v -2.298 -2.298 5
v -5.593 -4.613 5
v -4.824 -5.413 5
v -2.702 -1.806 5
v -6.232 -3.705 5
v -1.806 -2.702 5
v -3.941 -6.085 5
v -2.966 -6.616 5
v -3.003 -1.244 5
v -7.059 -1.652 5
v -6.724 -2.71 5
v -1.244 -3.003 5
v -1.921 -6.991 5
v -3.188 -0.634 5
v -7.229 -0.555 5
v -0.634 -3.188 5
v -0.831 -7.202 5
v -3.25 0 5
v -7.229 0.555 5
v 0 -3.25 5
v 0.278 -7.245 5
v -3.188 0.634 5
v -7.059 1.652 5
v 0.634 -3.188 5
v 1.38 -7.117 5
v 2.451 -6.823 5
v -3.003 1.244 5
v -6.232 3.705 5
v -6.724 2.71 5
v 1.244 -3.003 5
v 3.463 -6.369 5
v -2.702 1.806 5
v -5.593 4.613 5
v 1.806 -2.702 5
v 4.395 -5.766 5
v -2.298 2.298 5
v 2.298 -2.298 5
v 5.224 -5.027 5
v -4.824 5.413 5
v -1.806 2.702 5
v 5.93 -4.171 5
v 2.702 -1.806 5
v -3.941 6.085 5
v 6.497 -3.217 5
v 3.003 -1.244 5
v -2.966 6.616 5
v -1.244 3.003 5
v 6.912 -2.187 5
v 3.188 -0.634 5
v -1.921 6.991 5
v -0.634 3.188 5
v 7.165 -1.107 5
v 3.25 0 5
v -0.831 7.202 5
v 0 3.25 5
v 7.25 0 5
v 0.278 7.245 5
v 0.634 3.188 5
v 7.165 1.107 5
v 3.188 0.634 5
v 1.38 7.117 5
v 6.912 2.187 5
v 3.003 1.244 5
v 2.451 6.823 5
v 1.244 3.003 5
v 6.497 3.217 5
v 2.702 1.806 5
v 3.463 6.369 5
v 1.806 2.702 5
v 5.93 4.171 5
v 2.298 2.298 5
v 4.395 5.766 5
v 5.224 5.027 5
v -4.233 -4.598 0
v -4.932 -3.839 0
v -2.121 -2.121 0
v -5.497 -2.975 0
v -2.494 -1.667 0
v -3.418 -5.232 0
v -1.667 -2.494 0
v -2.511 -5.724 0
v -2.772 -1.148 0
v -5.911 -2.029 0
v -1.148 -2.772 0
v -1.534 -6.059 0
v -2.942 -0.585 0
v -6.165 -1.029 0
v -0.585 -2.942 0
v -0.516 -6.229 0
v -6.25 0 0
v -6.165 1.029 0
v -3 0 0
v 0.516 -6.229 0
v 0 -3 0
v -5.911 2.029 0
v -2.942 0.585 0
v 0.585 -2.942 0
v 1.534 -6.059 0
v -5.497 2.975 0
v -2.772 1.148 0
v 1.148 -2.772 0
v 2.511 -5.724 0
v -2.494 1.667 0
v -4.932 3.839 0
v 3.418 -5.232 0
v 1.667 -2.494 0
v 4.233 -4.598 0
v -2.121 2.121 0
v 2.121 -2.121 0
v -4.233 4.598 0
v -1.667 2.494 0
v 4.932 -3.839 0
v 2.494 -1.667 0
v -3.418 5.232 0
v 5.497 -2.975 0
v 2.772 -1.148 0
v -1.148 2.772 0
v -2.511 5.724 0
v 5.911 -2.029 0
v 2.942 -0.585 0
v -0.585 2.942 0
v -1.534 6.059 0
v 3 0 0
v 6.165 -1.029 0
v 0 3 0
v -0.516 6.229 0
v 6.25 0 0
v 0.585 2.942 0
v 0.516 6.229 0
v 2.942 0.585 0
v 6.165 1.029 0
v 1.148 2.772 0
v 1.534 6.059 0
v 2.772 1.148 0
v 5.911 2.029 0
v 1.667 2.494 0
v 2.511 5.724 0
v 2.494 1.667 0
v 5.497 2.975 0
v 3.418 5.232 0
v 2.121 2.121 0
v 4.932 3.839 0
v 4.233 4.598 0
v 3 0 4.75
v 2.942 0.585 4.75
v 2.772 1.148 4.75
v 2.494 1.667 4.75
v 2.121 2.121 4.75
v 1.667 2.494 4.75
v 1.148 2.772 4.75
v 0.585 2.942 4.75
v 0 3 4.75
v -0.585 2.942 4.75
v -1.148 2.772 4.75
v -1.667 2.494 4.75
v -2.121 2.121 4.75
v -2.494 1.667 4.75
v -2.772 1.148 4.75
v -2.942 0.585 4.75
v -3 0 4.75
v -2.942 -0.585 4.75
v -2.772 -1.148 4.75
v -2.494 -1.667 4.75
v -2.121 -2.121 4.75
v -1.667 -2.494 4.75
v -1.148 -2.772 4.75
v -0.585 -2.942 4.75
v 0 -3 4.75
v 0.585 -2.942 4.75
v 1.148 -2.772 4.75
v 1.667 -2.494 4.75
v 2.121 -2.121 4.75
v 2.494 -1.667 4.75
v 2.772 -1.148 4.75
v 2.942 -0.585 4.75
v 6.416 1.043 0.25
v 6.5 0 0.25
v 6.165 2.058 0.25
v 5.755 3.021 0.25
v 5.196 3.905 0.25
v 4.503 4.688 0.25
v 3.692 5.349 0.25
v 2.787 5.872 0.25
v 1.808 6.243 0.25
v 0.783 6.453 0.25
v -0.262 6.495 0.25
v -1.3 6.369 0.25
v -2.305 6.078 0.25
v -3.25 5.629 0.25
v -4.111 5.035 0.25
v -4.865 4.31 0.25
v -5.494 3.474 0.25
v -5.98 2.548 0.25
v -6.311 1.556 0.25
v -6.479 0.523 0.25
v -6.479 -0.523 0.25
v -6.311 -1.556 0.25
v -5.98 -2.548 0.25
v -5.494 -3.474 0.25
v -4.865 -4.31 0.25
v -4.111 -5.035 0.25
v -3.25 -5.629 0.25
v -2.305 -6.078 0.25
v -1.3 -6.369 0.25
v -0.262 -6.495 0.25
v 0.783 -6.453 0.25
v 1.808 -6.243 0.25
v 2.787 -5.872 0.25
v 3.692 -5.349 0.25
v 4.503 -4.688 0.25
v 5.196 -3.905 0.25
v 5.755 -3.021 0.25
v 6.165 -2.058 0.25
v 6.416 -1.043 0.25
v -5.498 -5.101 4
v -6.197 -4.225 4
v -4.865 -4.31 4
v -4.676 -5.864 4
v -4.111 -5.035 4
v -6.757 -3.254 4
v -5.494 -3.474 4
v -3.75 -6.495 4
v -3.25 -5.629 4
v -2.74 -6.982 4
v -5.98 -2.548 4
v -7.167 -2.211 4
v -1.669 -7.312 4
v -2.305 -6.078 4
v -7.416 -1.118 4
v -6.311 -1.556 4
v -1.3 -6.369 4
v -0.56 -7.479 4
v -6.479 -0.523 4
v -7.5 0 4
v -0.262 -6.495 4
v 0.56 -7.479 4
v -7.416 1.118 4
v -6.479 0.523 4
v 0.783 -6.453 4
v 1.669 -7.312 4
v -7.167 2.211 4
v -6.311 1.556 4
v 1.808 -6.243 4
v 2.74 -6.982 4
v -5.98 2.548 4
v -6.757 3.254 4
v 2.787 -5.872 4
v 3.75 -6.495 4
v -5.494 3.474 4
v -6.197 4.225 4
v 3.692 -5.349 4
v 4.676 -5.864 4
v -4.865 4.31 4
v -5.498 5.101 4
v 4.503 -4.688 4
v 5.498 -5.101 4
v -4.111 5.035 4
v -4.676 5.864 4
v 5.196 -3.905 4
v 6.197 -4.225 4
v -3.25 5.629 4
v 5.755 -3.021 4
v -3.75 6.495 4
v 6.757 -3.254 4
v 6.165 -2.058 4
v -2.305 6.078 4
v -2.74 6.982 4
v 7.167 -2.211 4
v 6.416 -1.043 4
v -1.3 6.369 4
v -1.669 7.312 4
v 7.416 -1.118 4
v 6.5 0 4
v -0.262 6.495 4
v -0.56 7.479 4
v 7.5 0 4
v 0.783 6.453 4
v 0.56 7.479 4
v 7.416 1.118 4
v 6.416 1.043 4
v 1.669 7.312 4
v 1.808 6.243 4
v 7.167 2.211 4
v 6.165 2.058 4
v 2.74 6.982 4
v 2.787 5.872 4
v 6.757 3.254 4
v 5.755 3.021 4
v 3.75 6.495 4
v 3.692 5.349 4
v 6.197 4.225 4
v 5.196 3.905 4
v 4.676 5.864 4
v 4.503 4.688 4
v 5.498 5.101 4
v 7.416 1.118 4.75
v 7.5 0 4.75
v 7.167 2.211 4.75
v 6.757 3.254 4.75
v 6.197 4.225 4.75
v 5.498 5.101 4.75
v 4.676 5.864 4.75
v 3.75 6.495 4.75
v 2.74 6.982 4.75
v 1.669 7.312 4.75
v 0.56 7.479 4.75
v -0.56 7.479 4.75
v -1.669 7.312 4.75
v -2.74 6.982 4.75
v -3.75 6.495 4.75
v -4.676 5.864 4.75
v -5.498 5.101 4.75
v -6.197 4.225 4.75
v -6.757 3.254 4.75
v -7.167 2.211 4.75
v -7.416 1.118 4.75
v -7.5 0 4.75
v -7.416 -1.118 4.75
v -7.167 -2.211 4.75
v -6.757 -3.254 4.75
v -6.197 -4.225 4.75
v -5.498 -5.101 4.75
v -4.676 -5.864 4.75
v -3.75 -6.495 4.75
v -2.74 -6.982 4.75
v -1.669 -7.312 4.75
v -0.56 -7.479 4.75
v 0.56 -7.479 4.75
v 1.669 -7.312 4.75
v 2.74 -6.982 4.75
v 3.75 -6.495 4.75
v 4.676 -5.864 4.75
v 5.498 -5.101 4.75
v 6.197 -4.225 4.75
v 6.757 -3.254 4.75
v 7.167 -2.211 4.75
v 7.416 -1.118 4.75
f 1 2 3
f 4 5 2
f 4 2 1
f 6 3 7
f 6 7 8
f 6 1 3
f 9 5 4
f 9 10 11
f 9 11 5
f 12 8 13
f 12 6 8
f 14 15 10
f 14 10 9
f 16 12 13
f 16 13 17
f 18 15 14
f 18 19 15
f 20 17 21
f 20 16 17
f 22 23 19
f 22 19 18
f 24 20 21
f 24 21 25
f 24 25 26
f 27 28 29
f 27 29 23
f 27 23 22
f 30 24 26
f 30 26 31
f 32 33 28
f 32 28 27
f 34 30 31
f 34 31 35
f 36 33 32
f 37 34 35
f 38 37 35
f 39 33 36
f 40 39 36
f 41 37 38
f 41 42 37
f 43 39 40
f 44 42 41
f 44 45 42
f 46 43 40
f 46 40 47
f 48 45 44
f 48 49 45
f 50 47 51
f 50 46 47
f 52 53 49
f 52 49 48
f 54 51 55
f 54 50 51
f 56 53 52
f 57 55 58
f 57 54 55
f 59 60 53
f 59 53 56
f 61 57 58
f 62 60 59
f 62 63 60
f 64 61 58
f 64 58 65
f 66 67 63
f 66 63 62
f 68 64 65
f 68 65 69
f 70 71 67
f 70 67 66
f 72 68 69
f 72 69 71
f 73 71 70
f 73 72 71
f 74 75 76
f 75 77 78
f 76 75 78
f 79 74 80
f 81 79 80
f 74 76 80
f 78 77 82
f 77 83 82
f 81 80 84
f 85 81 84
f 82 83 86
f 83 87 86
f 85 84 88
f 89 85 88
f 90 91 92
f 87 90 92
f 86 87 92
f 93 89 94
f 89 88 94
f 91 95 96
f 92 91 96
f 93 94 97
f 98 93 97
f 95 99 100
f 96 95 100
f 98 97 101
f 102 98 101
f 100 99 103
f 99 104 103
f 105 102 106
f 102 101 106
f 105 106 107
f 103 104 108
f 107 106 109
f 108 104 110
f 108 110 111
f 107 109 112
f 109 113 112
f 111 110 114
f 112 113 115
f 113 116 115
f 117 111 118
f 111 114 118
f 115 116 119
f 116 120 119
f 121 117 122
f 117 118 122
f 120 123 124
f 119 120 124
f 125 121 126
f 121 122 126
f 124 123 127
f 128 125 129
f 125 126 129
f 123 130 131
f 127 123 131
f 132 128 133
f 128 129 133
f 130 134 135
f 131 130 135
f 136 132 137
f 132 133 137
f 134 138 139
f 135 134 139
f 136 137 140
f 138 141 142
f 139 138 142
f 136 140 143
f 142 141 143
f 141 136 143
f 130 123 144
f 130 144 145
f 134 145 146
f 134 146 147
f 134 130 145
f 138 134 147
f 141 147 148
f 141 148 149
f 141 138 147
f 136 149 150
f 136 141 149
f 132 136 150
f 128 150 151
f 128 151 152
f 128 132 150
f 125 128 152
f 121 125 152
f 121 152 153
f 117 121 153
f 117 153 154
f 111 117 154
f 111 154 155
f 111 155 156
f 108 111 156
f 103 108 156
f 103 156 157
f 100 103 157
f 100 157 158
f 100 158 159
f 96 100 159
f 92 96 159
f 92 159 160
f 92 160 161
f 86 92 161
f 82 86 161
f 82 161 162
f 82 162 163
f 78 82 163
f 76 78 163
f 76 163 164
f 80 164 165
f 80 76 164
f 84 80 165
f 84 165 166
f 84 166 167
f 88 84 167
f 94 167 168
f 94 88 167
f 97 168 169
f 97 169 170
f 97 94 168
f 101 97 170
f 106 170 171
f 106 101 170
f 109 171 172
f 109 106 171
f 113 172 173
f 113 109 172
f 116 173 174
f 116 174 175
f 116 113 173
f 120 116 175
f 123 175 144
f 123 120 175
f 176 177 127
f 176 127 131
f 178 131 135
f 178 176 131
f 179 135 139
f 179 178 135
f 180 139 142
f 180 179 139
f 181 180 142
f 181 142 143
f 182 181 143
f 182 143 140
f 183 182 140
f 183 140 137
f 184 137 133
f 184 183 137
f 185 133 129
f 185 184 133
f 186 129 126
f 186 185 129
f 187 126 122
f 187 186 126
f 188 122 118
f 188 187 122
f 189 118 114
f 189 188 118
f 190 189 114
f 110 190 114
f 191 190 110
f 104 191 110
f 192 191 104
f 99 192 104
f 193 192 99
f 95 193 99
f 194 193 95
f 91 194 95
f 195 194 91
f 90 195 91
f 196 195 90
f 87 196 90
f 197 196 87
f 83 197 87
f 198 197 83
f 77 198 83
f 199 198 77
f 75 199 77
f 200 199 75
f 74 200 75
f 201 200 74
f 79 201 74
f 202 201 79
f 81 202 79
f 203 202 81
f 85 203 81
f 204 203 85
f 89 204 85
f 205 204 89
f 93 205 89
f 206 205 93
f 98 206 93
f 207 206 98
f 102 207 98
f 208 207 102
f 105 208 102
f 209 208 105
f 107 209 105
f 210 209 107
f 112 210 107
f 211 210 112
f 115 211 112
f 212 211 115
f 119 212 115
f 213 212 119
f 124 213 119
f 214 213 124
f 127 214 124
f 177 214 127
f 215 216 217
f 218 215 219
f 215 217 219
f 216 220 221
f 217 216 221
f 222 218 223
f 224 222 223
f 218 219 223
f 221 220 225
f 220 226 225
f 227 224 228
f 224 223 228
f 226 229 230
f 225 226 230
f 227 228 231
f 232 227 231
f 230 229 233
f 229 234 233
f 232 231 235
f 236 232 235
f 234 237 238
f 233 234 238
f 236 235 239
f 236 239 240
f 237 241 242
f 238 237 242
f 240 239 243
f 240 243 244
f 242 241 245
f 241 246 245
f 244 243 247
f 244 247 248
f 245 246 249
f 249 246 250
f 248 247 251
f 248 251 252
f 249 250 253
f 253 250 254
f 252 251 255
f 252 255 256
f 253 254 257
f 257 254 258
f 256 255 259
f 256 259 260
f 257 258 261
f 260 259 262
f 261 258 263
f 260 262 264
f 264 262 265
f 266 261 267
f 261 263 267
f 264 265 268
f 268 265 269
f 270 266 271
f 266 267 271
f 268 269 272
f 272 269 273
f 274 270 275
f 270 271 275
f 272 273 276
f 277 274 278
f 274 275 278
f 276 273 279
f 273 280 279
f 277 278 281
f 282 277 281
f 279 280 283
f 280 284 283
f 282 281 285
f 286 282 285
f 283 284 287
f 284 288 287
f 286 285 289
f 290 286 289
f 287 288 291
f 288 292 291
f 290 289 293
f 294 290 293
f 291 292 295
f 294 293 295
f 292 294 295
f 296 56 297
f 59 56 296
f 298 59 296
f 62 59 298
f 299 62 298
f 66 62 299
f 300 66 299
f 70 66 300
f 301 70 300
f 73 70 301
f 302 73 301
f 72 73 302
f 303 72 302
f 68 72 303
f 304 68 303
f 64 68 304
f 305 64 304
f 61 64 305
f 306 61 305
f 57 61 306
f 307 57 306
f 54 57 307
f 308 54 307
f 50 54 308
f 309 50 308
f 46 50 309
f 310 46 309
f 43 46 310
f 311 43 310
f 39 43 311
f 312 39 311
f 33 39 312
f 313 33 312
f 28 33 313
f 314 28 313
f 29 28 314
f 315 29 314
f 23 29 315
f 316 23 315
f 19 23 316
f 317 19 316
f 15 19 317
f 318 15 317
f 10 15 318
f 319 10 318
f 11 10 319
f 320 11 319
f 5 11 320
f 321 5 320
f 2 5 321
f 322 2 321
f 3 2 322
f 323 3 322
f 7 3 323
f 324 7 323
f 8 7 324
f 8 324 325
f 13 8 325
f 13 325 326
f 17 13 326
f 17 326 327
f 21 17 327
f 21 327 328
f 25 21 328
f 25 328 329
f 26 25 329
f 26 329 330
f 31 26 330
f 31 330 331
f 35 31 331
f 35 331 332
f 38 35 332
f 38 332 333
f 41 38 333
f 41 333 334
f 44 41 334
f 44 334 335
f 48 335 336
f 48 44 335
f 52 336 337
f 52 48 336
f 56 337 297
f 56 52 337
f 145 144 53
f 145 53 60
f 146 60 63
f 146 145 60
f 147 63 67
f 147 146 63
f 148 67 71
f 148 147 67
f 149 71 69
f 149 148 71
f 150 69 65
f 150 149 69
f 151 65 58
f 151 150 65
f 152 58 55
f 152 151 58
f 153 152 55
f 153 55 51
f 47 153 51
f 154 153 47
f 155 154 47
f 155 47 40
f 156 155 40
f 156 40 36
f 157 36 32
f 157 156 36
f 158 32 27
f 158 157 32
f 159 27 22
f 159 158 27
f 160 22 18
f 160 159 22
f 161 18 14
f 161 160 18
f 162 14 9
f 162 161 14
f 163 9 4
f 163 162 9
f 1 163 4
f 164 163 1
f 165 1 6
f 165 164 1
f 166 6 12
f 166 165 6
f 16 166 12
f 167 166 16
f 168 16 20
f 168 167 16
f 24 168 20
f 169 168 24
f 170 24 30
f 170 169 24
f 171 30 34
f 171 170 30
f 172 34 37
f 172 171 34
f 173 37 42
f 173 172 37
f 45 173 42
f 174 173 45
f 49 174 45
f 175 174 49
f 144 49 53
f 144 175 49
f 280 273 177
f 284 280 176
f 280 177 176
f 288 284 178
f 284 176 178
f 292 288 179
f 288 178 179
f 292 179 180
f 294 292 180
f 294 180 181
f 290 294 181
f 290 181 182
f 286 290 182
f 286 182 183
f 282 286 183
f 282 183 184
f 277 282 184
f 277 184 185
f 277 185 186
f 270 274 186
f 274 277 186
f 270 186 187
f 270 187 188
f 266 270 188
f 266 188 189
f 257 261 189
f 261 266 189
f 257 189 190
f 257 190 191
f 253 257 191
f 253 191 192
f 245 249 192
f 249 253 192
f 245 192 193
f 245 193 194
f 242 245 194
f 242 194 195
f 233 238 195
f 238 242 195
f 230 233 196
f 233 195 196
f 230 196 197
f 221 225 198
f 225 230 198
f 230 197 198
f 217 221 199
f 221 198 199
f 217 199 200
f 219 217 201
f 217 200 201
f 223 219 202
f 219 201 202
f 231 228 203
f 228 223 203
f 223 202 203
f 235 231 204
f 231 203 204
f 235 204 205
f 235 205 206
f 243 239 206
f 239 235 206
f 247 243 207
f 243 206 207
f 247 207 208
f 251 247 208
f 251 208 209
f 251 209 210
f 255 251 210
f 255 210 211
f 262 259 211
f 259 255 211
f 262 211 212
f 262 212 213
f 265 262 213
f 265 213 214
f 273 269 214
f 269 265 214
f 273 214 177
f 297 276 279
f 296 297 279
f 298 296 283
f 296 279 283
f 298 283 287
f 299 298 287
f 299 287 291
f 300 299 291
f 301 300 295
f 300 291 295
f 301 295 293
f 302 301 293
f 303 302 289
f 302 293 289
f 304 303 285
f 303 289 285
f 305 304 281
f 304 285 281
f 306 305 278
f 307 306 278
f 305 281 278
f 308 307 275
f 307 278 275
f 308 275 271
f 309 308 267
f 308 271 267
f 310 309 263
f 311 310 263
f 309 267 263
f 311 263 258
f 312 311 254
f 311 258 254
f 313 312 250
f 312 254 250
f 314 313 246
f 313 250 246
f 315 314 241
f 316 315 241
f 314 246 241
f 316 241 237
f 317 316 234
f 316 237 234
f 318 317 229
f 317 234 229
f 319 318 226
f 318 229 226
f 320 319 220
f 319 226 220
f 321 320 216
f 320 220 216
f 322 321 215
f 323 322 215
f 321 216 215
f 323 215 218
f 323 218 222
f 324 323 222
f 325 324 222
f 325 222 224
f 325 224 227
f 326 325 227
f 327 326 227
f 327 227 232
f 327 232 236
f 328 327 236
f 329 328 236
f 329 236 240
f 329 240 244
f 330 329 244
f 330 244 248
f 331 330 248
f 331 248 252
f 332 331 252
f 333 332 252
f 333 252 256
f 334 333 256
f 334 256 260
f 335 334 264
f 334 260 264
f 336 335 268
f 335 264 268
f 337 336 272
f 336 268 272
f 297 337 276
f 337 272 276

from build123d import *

# Parameters (mm, degrees)
ESQUISSE1_R        = 6.5
ESQUISSE1_R_2      = 3
BOSS_EXTRU_1_DEPTH = 5
BOSS_EXTRU_2_START = -1
ESQUISSE2_R        = 7.5
ESQUISSE2_R_2      = 3
BOSS_EXTRU_2_DEPTH = 1
CHANFREIN1_SIZE    = 0.25


with BuildPart() as part:
    # Esquisse1 → Boss.-Extru.1 (new body)
    with BuildSketch(Plane.XY):
        Circle(ESQUISSE1_R)
        Circle(ESQUISSE1_R_2, mode=Mode.SUBTRACT)
    extrude(amount=BOSS_EXTRU_1_DEPTH)

    # Esquisse2 → Boss.-Extru.2 (add)
    with BuildSketch(Plane.XY.offset(5).offset(BOSS_EXTRU_2_START)):
        Circle(ESQUISSE2_R)
        Circle(ESQUISSE2_R_2, mode=Mode.SUBTRACT)
    extrude(amount=BOSS_EXTRU_2_DEPTH)

    # Chanfrein1
    chanfrein1_edges = [part.edges().sort_by_distance(p)[0] for p in [
        (-7.5, 0, 5),
        (-6.5, 0, 0),
        (-3, 0, 5),
    ]]
    chamfer(chanfrein1_edges, length=CHANFREIN1_SIZE)


solid = part.part
